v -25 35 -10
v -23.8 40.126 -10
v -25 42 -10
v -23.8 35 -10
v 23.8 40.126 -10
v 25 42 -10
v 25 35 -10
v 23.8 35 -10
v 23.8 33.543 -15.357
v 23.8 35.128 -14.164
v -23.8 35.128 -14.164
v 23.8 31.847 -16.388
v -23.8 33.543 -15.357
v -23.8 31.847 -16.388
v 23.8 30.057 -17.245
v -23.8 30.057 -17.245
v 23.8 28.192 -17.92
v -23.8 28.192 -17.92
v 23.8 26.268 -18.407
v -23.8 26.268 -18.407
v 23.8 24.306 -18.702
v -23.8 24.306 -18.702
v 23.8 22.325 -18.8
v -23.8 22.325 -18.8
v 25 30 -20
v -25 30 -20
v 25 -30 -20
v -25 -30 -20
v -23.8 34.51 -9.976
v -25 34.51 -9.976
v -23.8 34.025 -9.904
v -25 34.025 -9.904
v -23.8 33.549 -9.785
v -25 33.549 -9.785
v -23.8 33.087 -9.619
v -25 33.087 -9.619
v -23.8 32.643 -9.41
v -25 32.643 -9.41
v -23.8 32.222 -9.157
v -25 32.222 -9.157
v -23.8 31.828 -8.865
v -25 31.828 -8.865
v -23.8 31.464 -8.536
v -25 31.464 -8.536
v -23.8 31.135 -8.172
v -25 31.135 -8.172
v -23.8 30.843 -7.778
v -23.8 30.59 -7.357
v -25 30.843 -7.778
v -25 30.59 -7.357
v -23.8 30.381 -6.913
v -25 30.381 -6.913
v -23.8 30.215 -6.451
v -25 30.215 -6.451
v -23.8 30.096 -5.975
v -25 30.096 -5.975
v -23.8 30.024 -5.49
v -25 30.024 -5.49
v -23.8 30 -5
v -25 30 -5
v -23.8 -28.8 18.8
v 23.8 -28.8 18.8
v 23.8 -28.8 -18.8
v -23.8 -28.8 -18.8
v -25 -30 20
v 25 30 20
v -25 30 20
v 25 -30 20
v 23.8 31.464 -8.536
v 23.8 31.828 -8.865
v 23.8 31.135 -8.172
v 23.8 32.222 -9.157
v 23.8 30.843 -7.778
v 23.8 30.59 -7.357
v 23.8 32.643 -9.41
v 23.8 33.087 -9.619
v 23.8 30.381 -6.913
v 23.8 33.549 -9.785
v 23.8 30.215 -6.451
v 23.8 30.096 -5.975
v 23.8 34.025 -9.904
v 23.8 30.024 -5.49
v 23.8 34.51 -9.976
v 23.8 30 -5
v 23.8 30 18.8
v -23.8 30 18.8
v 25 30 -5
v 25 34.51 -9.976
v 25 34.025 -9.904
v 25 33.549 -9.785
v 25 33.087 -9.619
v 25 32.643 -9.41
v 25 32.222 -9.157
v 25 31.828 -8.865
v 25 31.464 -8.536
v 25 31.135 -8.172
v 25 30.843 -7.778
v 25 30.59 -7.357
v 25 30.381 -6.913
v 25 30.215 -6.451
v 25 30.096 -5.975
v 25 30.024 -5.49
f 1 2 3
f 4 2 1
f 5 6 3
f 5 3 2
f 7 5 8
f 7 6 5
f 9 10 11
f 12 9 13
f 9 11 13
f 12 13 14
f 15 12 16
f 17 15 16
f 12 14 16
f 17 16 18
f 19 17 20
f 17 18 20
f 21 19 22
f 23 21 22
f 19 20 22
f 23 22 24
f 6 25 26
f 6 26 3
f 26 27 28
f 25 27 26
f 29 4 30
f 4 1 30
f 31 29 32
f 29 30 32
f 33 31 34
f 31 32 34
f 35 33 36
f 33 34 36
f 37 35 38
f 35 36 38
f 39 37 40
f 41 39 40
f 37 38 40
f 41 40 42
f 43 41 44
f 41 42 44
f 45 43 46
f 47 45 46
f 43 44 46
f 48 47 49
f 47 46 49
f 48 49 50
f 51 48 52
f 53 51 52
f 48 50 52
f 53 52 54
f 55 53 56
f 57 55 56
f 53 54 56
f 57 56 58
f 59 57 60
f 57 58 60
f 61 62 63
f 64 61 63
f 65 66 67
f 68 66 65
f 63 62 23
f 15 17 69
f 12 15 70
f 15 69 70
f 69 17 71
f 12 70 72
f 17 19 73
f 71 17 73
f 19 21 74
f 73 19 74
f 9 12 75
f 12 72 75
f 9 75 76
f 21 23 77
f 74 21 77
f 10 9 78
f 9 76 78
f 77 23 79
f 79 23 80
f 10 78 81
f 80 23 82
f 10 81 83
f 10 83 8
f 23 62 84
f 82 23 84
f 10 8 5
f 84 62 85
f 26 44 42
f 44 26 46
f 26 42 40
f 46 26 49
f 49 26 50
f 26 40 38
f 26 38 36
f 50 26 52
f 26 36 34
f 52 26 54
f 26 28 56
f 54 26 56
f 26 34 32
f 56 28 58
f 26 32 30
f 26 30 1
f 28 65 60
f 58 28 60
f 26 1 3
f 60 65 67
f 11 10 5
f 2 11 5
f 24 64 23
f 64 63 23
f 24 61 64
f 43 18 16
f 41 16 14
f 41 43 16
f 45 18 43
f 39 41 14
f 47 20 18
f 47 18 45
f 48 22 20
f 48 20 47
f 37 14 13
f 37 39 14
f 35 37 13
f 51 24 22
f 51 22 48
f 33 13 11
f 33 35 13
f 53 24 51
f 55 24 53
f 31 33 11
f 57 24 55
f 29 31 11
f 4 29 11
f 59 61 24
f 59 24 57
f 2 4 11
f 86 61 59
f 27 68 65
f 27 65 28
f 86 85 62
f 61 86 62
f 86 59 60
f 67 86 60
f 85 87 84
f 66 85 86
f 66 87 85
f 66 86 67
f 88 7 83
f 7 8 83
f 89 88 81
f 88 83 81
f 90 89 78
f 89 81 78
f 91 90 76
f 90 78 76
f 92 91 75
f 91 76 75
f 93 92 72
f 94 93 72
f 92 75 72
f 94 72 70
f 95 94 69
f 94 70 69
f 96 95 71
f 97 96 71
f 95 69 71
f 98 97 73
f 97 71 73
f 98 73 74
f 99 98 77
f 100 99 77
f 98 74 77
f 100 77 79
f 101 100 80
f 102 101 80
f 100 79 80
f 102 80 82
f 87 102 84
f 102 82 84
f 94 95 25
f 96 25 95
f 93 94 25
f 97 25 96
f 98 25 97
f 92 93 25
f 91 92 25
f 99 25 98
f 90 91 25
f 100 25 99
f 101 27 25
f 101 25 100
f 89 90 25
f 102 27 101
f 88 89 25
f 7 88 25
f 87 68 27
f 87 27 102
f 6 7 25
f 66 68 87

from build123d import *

# Parameters (mm, degrees)
F1_DEPTH = 25
F2_T     = -1.2
F3_R     = 20
F4_R     = 5


with BuildPart() as f1:
    # F0 (on Right) → F1 (new body, symmetric)
    with BuildSketch(Plane.YZ):
        Polygon((30, -10), (30, 20), (-30, 20), (-30, -20), (30, -20), align=None)
        Polygon((42, -10), (30, -10), (30, -20), align=None)
    extrude(amount=F1_DEPTH, both=True)

    # F2
    f2_openings = [f1.faces().sort_by_distance(p)[0] for p in [
        (0, 30, 5),
        (0, 36, -10),
    ]]
    offset(amount=F2_T, openings=f2_openings)

    # F3
    f3_edges = [f1.edges().sort_by_distance(p)[0] for p in [
        (0, 29.56554, -18.8),
    ]]
    fillet(f3_edges, radius=F3_R)

    # F4
    f4_edges = [f1.edges().sort_by_distance(p)[0] for p in [
        (-24.4, 30, -10),
        (24.4, 30, -10),
    ]]
    fillet(f4_edges, radius=F4_R)


solid = f1.part
